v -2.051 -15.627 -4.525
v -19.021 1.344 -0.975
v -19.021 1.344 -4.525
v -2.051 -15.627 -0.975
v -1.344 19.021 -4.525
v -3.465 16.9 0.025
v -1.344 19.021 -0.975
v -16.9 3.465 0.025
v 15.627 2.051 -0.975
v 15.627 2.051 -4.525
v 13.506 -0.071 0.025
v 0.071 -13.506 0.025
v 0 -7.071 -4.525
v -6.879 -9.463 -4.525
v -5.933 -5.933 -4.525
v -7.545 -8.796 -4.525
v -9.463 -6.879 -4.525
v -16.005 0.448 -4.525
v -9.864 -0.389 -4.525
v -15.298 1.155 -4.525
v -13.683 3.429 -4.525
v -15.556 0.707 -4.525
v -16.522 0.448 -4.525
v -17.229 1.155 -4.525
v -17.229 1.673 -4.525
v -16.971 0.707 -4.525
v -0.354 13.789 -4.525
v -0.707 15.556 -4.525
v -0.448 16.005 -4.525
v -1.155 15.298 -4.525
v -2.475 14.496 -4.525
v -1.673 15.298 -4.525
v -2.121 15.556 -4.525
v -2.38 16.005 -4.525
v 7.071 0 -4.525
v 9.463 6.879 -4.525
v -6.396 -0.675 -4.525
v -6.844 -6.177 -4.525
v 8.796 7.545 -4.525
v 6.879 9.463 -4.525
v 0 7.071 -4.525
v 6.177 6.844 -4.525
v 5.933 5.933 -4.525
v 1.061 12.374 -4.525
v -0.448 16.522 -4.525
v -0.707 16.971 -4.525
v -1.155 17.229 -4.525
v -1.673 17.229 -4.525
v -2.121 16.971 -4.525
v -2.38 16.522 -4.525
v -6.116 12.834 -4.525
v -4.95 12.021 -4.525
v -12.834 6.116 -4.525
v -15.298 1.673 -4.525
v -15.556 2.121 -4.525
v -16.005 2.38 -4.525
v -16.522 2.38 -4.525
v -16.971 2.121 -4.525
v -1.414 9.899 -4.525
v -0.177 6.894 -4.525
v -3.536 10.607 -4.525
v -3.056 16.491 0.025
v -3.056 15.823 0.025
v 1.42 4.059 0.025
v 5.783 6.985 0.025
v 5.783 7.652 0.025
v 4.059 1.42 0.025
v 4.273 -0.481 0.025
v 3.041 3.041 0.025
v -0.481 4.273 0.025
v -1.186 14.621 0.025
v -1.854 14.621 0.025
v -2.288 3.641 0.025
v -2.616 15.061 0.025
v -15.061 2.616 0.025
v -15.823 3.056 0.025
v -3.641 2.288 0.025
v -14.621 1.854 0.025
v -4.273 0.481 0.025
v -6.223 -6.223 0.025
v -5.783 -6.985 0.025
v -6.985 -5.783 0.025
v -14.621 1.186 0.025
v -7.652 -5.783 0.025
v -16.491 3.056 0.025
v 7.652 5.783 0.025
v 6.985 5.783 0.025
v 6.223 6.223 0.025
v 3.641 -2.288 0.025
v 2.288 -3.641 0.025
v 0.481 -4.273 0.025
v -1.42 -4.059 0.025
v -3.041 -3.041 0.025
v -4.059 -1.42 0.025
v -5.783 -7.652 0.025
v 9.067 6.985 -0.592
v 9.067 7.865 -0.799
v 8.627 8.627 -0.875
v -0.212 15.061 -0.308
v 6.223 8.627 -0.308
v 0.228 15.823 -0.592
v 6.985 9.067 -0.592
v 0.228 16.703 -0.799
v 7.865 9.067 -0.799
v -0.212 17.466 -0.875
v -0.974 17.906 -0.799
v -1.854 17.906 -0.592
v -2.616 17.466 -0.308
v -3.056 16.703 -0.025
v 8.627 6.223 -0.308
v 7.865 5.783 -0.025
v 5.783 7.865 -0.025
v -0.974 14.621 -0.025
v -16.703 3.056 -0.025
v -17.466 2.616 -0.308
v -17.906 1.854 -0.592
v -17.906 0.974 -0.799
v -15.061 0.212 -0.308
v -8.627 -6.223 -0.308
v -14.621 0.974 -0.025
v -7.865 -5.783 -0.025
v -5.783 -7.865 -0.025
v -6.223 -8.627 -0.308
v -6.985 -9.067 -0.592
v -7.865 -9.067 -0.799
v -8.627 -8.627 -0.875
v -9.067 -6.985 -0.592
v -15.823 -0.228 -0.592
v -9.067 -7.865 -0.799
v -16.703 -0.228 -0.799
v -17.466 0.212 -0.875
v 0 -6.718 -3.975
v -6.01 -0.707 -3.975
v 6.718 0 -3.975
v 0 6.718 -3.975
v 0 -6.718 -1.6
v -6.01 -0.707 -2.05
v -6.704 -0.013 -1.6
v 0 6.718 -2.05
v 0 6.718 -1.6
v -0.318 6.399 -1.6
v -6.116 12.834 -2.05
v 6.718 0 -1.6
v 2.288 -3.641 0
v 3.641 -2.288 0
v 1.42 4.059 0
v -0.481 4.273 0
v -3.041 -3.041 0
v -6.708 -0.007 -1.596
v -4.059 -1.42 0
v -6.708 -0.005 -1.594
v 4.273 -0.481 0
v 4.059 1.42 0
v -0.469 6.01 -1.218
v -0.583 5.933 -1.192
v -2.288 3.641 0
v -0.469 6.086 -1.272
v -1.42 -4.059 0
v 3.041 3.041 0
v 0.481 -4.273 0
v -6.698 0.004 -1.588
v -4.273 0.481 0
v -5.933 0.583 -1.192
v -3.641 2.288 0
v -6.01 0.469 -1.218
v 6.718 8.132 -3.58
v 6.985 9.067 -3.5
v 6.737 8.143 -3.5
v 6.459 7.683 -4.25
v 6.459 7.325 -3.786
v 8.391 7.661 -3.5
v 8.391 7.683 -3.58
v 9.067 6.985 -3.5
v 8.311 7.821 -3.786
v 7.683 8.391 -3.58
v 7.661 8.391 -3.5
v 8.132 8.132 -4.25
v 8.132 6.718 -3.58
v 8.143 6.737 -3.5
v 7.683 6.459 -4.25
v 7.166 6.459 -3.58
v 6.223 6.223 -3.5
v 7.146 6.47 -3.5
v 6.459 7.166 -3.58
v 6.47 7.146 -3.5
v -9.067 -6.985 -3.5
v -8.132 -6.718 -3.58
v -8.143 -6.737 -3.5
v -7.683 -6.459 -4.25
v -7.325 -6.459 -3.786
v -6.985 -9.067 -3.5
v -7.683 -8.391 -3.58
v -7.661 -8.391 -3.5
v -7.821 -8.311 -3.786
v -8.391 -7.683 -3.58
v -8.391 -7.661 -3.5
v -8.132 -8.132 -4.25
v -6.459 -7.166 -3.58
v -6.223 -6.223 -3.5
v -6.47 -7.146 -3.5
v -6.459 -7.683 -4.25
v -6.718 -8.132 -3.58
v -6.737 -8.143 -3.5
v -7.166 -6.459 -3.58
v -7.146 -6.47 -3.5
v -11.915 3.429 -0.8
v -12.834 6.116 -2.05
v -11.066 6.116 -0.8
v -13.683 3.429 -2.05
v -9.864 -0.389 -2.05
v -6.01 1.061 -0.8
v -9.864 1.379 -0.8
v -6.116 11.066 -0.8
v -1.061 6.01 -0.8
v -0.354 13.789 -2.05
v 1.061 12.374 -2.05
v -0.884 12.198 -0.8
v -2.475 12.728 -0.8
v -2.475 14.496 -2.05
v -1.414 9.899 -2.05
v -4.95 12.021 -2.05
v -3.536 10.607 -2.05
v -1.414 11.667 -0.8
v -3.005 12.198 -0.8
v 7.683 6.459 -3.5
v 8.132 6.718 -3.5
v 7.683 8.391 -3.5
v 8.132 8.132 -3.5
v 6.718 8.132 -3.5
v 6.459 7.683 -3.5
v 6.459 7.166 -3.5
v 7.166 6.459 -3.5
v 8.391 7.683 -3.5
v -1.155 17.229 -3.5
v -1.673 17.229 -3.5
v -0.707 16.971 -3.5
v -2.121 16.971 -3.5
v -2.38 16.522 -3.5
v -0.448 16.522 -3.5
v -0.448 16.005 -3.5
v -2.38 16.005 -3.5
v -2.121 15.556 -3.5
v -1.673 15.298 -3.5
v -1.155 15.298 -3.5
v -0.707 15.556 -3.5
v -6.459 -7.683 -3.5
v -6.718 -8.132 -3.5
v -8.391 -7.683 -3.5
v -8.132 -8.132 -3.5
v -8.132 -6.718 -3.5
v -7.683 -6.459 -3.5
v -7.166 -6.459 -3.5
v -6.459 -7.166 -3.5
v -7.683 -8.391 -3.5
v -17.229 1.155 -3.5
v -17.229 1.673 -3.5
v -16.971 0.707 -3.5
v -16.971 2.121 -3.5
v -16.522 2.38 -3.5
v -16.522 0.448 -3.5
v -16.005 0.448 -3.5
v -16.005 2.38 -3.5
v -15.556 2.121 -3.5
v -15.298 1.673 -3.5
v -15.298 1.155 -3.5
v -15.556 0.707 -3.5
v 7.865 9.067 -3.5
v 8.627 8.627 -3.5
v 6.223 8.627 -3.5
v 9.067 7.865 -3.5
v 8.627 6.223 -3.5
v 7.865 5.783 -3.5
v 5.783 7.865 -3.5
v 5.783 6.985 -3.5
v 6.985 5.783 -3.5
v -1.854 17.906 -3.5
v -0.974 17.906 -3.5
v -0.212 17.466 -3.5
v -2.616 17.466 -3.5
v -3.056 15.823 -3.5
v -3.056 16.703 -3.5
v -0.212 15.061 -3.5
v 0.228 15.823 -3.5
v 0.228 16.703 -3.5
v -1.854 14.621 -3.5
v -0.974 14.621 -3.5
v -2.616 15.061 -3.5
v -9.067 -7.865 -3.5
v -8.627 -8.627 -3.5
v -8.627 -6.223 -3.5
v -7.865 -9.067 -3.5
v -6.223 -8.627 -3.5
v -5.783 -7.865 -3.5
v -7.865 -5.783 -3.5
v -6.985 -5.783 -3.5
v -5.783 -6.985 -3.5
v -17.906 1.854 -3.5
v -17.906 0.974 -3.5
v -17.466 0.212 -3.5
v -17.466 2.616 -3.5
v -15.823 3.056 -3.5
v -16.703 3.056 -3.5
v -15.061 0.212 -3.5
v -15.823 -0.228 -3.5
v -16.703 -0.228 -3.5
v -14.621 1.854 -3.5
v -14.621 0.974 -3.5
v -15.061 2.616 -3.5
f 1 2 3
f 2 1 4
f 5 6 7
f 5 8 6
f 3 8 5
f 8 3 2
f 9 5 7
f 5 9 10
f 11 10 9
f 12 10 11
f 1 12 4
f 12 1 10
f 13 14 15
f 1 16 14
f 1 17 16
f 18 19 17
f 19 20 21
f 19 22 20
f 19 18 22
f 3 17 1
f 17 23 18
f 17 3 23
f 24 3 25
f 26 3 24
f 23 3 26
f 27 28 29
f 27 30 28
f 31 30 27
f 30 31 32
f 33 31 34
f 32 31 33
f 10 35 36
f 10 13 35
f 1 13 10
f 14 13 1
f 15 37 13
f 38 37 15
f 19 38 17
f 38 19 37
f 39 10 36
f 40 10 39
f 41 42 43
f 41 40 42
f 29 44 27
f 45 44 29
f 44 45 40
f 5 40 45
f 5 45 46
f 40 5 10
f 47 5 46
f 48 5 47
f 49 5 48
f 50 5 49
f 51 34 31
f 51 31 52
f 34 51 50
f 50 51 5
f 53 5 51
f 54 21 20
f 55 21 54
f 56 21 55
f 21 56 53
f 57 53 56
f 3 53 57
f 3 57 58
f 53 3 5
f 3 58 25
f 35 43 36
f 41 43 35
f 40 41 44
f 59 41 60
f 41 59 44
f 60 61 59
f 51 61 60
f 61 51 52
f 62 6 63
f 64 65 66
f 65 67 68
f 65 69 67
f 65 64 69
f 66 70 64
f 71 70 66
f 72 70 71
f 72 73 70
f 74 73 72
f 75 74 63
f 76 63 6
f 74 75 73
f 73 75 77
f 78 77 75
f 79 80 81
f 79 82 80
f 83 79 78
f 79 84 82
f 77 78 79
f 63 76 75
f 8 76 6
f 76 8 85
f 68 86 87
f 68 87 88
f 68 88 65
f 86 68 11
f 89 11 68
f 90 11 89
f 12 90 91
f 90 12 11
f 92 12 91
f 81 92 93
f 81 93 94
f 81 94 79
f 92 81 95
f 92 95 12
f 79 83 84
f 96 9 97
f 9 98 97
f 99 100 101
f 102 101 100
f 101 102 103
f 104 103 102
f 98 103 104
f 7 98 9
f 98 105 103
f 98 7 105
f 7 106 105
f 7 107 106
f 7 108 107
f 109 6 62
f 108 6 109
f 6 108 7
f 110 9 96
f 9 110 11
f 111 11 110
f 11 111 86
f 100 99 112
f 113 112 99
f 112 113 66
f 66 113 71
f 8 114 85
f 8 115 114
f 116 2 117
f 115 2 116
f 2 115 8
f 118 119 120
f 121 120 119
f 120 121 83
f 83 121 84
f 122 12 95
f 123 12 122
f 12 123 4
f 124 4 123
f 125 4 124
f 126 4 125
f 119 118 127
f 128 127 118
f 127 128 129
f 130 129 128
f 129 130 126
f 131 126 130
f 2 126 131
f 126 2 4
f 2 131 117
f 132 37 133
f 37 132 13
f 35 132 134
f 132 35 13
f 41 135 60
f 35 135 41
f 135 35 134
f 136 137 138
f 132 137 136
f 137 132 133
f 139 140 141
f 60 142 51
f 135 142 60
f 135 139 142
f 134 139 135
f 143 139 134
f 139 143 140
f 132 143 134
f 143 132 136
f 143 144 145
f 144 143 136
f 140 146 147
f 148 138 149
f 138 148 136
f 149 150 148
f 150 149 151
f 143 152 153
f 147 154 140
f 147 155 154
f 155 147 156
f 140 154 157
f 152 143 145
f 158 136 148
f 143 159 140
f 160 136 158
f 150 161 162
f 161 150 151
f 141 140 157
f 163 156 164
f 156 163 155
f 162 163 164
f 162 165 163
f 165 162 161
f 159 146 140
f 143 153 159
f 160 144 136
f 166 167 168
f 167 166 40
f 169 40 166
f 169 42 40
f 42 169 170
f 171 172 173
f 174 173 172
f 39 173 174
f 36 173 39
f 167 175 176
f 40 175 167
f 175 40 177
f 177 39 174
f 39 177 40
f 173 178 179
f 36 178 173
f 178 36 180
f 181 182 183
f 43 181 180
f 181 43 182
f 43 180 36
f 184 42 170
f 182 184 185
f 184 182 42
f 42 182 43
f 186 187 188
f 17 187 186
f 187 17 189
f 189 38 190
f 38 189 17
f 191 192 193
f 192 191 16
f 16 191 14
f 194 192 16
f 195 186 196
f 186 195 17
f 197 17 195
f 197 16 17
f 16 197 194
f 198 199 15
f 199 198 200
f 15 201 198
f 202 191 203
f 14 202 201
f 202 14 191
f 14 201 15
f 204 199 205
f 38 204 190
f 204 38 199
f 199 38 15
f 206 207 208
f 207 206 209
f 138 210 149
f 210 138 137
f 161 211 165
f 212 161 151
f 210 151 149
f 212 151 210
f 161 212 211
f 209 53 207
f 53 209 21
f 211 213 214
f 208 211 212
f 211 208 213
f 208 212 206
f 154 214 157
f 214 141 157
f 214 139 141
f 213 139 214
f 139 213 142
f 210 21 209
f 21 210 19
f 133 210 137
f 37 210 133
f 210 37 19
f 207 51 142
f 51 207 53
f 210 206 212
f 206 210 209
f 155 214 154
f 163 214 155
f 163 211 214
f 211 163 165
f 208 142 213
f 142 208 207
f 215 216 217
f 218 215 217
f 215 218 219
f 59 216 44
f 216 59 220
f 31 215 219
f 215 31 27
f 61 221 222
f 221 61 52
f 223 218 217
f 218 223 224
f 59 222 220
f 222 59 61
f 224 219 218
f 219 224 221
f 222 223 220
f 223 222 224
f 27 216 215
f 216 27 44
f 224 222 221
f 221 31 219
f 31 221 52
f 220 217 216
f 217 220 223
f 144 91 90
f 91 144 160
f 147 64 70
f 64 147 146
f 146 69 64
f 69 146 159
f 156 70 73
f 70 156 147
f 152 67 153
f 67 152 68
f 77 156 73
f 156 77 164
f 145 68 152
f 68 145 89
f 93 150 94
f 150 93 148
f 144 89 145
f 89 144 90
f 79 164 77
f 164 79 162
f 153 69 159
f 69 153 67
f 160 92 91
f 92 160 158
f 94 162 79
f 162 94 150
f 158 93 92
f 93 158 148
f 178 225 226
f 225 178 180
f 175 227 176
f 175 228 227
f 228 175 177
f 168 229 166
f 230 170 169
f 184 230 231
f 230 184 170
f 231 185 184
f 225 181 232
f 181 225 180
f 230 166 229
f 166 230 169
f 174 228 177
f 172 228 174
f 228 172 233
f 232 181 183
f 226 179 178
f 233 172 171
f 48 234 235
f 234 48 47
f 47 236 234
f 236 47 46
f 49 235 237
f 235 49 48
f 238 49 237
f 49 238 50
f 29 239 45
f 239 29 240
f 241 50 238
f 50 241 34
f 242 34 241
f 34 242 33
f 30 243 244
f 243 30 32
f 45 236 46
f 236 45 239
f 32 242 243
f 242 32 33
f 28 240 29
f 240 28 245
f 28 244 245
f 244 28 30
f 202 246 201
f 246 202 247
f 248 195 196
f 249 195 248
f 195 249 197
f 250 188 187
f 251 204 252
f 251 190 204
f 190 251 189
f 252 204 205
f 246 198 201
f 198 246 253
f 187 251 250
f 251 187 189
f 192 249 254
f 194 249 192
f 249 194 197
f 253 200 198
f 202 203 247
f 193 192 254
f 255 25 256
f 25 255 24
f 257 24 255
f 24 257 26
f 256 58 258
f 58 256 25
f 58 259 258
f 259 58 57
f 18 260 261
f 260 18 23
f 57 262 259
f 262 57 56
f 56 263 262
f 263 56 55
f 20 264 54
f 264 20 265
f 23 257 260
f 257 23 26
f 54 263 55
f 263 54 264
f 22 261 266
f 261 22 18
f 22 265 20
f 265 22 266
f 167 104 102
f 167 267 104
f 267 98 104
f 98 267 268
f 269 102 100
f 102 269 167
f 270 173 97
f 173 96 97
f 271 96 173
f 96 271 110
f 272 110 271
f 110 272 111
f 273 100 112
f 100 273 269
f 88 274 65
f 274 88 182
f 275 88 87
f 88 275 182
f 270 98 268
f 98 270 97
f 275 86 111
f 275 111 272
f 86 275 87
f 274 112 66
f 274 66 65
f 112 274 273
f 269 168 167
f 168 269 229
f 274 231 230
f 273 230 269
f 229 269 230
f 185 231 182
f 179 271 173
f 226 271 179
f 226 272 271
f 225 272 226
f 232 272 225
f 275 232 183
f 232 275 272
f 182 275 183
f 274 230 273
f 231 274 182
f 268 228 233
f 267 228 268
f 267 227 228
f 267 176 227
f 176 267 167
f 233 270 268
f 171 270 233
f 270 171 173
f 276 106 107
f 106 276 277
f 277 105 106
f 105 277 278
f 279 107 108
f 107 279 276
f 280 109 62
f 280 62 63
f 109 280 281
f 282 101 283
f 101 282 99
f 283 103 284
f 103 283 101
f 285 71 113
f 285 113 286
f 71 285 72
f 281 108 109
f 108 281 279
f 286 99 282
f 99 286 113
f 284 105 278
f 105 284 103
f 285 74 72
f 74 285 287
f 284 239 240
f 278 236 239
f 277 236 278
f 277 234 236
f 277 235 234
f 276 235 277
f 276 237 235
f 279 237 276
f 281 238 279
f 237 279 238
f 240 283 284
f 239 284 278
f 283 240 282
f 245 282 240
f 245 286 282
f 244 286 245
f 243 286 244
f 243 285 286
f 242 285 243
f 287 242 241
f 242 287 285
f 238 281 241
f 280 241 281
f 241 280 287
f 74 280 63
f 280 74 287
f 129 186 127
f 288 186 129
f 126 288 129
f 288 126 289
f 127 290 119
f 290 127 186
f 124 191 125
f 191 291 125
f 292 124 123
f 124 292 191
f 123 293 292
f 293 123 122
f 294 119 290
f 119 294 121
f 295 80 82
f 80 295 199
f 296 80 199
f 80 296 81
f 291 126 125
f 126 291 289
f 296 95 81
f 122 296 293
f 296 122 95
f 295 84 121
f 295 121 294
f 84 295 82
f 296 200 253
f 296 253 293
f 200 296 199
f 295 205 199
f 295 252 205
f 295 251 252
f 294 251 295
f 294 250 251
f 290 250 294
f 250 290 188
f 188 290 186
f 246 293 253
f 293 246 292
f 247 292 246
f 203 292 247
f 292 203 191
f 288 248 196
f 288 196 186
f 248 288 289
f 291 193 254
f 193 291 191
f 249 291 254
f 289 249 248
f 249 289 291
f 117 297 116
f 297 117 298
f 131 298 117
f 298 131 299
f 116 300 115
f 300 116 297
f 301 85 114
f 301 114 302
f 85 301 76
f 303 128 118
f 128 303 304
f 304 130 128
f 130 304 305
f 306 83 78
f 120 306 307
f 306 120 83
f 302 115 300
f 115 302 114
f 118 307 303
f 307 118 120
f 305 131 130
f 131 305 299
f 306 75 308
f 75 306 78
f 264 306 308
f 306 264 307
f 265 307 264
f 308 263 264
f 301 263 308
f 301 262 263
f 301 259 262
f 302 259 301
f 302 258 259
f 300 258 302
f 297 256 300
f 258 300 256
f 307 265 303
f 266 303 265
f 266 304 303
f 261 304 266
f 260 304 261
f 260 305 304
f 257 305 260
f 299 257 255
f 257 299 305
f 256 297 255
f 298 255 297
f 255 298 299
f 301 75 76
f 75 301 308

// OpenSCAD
/******************************************************************
*                                                                 *
* OpenFlexure Microscope: Raspberry Pi Camera v2 push-fit mount   *
*                                                                 *
* This is part of the OpenFlexure microscope, an open-source      *
* microscope and 3-axis translation stage.  It gets really good   *
* precision over a ~10mm range, by using plastic flexure          *
* mechanisms.                                                     *
*                                                                 *
* This file provides two parts for the microscope; the bit that   *
* fits onto the camera (picam2_camera_mount) and a cover that     *
* protects the PCB (picam_cover).  The former is part of the      *
* optics module in optics.scad, and the latter is printed         *
* directly.                                                       *
*                                                                 *
* The fit is set by one main function, picam2_push_fit().  It's   *
* designed to be subtracted from a solid block, with the bottom   *
* of the block at z=0.  It grips the plastic camera housing with  *
* four slightly flexible fingers, which ensures the camera pops   *
* in easily but is held relatively firmly.  Two screw holes are   *
* also provided that should self-tap with M2 or similar screws.   *
* I recommend you use these for extra security if the camera is   *
* likely to be handled a lot.                                     *
*                                                                 *
* (c) Richard Bowman, January 2016                                *
* Released under the CERN Open Hardware License                   *
*                                                                 *
******************************************************************/


use <../utilities.scad>;

d=0.05; //small distance!

function picamera_2_camera_mount_height() = 4.5;
bottom = picamera_2_camera_mount_height() * -1;

function picamera_2_camera_sensor_height() = 2; //Height of the sensor above the PCB

module picam2_flex_and_components(cw=8.5+1){
    // A 2D perimeter inside which the flex and components of the camera sit.
    // NB this should fit both v1 and v2 of the module
    // cw is the width of the camera module's casing, nominally 8 or 8.5mm but
    // deliberately printed a bit generous to ensure it fits easily without 
    // damaging the flex.
    
    translate([-cw/2,cw/2-1]) square([cw,13.4-cw/2+1]); //flex (also clears v1 connector)
    translate([-cw/2-2.5,6.7]) square([cw+2.5, 5.4]); //connector
}

module picam1_led(){
    // v1 of the camera module has an LED on board that we should make a cut-out for
    translate([5,10]) square([3.5,2]);
    translate([6,8]) square([3.5,2]);
}
    
module picam2_cutout( beam_length=15){
    // This module is designed to be subtracted from the bottom of a shape.
    // The z=0 plane should be the print bed.
    // It includes cut-outs for the components on the PCB and also a push-fit hole
    // for the camera module.  This uses flexible "fingers" to grip the camera firmly
    // but gently.  Just push to insert, and wiggle to remove.  You may find popping 
    // off the brown ribbon cable and removing the PCB first helps when extracting
    // the camera module again.
    cw = 8.5 + 1.0; //size of camera box sides (NB deliberately loose fitting)
    ch=2.9; //height of camera box (including foam support)
    camera = [cw,cw,ch]; //size of camera box
    hole_r = 4.3; //size of camera aperture
	union(){
        sequential_hull(){
            //cut-out for camera
            translate([0,0,-d]) cube([cw+0.5,cw+0.5,d],center=true); //wider at bottom
            translate([0,0,0.5]) cube([cw,cw,d],center=true);
            translate([0,0,ch/2]) cube([cw,cw,ch],center=true);
            cylinder(r=hole_r, h=2*picamera_2_camera_mount_height(), center=true);
        }
            
        //clearance for the ribbon cable at top of camera
        fh=2.5; // the height of the flex
        mh = picamera_2_camera_mount_height();
        
        dz = mh-fh-0.75; // extra height above the flex for the sloping "roof"
        rw = cw - 2*dz; 
        hull(){
            translate([0,0,-d]) linear_extrude(fh) picam2_flex_and_components(cw);
            translate([0,0,-d]) linear_extrude(fh+dz) offset(-dz) picam2_flex_and_components(cw);
        }
        //clearance for the LED/resistor on v1 of the camera
        hull(){
            translate([0,0,-d]) linear_extrude(fh) picam1_led();
            translate([0,0,-d]) linear_extrude(fh+dz) offset(-dz) picam1_led();
        }
        
        //beam clearance
        cylinder(r=hole_r, h=beam_length);
        
        //chamfered screw holes for mounting
        sx = 21/2; //position of screw holes
        reflect([1,0,0]) translate([sx,0,0]) rotate(60){
            //cylinder(r1=3, r2=0,h=4, center=true); //chamfered bottom
            //deformable_hole_trylinder(1.5/2,2.1/2,h=12, center=true);
            cylinder(r1=3.1, r2=1.1, h=5, $fn=3, center=true);
            cylinder(r=1.1, h=20, $fn=3, center=true);
        }
	}
}
//picam2_cutout();

module picamera_2_camera_mount(counterbore=false){
    // A mount for the pi camera v2
    // This should finish at z=0+d, with a surface that can be
    // hull-ed onto the lens assembly.
    b = 24;
    w = 25;
    difference(){
        rotate(45) translate([0,2.4,0]) sequential_hull(){
            translate([0,0,bottom]) cube([w,b,d],center=true);
            translate([0,0,-1]) cube([w,b,d],center=true);
            translate([0,0,0]) cube([w-(-1.5-bottom)*2,b,d],center=true);
        }
        rotate(45) translate([0,0,bottom]) picam2_cutout();
        if(counterbore){
            translate([0,0,bottom-1]) picamera_2_bottom_mounting_posts(h=999, r=1, cutouts=false);
            translate([0,0,bottom+1])  picamera_2_bottom_mounting_posts(h=999, r=1.7, cutouts=false);
        }
    }
}
difference(){
    picamera_2_camera_mount(counterbore=true);
    //rotate([90,0,0]) cylinder(r=999,h=999,$fn=4);
}

module picamera_2_bottom_mounting_posts(h=2, r=2, cutouts=true){
    // posts to mount to pi camera from below
    rotate(45)
    reflect([1,0,0]) for(y=[0,12.5]) translate([21/2, y, 0]) difference(){
        cylinder(r=r, h=h, $fn=12);
        if(cutouts) cylinder(d=2, h=999, center=true, $fn=8);
    }
}

/////////// Cover for camera board //////////////
module picamera_2_cover(){
    // A cover for the camera PCB, slips over the bottom of the camera
    // mount.  This version should be compatible with v1 and v2 of the board
    b = 24;
    w = 25;
    h = 3;
    t = 1; //wall thickness
    centre_y=2.4;
    difference(){
        union(){
            //bottom and sides
            difference(){
                translate([-w/2,-b/2+centre_y,0]) cube([w, b, h]);
                // cut out centre to form walls on 3 sides
                translate([-w/2+t,-b/2+centre_y-t,0.75]) cube([w-2*t, b, h]);
                //chamfer the connector edge for ease of access
                translate([-999,-b/2+centre_y,h]) rotate([-135,0,0]) cube([9999,999,999]);
            }
            //mounting screws
            reflect([1,0,0]) translate([21/2, 0, 0]) cylinder(r=3, h=h, $fn=16);
        }
        //counterbore the mounting screws
        reflect([1,0,0]) translate([21/2, 0, h-1]) rotate(90) intersection(){
           cylinder(r=2, h=999, $fn=16, center=true);
            hole_from_bottom(r=1.1, h=999, base_w=999);
        }
    }
} 
//picam_cover();

pcb = [25.4+0.5,24+0.5,2]; //size of the picam PCB (+0.5mm so it fits)
camera_housing = [9,9,2.5]; //size of the plastic housing
camera_housing_y = 2.5; //shift of the camera housing from the centre
lens_unscrew_r = 5.5/2; //size of the bit we unscrew
    
module generous_camera_bits(){
    //The other stuff on the PCB (mostly the ribbon cable)
    camera = [8.5,8.5,2.3]; //size of camera box
	cw = camera[0]+1; //side length of camera box at bottom (slightly larger)
	union(){
		//ribbon cable at top of camera
        sequential_hull(){
            translate([0,0,0]) cube([cw-1,d,4],center=true);
            translate([0,9.4-(4.4/1)/2,0]) cube([cw-1,1,4],center=true);
        }
        //flex connector
        translate([-1.25,9.4,0]) cube([cw-1+2.5, 4.4+1, 4],center=true);
        
	}
}

module picamera_2_gripper(){
    // this little bit of plastic grips the plastic camera housing
    // and allows you to safely unscrew the lens
    // it protects the (surprisingly delicate) flex that connects the camera to the PCB.
    outer = pcb+[4,-5,camera_housing[2]]; //size of the tool
    difference(){
        translate([0,-1,outer[2]/2]) cube(outer, center=true);
        
        //central hole for the camera housing
        translate([0,camera_housing_y,0]) cube(camera_housing + [0,0,999],center=true);
        
        //cut-outs for the other bits (cable etc.)
        translate([0,camera_housing_y,camera_housing[2]]) rotate([180,0,0]) generous_camera_bits();
        
        //indent for PCB
        translate([0,0,outer[2]]) cube(pcb + [0,0,pcb[2]],center=true);
    
    }
}

module picamera_2_lens_gripper(){
    //a tool to unscrew the lens from the pi camera
    inner_r = 4.7/2;
    union(){
        difference(){
            cylinder(r=7,h=2);
            cylinder(r=5,h=999,center=true);
        }
        for(a=[0,90,180,270]) rotate(a) translate([inner_r,0,0]) cube([1.5,5,2]);
    }
}
